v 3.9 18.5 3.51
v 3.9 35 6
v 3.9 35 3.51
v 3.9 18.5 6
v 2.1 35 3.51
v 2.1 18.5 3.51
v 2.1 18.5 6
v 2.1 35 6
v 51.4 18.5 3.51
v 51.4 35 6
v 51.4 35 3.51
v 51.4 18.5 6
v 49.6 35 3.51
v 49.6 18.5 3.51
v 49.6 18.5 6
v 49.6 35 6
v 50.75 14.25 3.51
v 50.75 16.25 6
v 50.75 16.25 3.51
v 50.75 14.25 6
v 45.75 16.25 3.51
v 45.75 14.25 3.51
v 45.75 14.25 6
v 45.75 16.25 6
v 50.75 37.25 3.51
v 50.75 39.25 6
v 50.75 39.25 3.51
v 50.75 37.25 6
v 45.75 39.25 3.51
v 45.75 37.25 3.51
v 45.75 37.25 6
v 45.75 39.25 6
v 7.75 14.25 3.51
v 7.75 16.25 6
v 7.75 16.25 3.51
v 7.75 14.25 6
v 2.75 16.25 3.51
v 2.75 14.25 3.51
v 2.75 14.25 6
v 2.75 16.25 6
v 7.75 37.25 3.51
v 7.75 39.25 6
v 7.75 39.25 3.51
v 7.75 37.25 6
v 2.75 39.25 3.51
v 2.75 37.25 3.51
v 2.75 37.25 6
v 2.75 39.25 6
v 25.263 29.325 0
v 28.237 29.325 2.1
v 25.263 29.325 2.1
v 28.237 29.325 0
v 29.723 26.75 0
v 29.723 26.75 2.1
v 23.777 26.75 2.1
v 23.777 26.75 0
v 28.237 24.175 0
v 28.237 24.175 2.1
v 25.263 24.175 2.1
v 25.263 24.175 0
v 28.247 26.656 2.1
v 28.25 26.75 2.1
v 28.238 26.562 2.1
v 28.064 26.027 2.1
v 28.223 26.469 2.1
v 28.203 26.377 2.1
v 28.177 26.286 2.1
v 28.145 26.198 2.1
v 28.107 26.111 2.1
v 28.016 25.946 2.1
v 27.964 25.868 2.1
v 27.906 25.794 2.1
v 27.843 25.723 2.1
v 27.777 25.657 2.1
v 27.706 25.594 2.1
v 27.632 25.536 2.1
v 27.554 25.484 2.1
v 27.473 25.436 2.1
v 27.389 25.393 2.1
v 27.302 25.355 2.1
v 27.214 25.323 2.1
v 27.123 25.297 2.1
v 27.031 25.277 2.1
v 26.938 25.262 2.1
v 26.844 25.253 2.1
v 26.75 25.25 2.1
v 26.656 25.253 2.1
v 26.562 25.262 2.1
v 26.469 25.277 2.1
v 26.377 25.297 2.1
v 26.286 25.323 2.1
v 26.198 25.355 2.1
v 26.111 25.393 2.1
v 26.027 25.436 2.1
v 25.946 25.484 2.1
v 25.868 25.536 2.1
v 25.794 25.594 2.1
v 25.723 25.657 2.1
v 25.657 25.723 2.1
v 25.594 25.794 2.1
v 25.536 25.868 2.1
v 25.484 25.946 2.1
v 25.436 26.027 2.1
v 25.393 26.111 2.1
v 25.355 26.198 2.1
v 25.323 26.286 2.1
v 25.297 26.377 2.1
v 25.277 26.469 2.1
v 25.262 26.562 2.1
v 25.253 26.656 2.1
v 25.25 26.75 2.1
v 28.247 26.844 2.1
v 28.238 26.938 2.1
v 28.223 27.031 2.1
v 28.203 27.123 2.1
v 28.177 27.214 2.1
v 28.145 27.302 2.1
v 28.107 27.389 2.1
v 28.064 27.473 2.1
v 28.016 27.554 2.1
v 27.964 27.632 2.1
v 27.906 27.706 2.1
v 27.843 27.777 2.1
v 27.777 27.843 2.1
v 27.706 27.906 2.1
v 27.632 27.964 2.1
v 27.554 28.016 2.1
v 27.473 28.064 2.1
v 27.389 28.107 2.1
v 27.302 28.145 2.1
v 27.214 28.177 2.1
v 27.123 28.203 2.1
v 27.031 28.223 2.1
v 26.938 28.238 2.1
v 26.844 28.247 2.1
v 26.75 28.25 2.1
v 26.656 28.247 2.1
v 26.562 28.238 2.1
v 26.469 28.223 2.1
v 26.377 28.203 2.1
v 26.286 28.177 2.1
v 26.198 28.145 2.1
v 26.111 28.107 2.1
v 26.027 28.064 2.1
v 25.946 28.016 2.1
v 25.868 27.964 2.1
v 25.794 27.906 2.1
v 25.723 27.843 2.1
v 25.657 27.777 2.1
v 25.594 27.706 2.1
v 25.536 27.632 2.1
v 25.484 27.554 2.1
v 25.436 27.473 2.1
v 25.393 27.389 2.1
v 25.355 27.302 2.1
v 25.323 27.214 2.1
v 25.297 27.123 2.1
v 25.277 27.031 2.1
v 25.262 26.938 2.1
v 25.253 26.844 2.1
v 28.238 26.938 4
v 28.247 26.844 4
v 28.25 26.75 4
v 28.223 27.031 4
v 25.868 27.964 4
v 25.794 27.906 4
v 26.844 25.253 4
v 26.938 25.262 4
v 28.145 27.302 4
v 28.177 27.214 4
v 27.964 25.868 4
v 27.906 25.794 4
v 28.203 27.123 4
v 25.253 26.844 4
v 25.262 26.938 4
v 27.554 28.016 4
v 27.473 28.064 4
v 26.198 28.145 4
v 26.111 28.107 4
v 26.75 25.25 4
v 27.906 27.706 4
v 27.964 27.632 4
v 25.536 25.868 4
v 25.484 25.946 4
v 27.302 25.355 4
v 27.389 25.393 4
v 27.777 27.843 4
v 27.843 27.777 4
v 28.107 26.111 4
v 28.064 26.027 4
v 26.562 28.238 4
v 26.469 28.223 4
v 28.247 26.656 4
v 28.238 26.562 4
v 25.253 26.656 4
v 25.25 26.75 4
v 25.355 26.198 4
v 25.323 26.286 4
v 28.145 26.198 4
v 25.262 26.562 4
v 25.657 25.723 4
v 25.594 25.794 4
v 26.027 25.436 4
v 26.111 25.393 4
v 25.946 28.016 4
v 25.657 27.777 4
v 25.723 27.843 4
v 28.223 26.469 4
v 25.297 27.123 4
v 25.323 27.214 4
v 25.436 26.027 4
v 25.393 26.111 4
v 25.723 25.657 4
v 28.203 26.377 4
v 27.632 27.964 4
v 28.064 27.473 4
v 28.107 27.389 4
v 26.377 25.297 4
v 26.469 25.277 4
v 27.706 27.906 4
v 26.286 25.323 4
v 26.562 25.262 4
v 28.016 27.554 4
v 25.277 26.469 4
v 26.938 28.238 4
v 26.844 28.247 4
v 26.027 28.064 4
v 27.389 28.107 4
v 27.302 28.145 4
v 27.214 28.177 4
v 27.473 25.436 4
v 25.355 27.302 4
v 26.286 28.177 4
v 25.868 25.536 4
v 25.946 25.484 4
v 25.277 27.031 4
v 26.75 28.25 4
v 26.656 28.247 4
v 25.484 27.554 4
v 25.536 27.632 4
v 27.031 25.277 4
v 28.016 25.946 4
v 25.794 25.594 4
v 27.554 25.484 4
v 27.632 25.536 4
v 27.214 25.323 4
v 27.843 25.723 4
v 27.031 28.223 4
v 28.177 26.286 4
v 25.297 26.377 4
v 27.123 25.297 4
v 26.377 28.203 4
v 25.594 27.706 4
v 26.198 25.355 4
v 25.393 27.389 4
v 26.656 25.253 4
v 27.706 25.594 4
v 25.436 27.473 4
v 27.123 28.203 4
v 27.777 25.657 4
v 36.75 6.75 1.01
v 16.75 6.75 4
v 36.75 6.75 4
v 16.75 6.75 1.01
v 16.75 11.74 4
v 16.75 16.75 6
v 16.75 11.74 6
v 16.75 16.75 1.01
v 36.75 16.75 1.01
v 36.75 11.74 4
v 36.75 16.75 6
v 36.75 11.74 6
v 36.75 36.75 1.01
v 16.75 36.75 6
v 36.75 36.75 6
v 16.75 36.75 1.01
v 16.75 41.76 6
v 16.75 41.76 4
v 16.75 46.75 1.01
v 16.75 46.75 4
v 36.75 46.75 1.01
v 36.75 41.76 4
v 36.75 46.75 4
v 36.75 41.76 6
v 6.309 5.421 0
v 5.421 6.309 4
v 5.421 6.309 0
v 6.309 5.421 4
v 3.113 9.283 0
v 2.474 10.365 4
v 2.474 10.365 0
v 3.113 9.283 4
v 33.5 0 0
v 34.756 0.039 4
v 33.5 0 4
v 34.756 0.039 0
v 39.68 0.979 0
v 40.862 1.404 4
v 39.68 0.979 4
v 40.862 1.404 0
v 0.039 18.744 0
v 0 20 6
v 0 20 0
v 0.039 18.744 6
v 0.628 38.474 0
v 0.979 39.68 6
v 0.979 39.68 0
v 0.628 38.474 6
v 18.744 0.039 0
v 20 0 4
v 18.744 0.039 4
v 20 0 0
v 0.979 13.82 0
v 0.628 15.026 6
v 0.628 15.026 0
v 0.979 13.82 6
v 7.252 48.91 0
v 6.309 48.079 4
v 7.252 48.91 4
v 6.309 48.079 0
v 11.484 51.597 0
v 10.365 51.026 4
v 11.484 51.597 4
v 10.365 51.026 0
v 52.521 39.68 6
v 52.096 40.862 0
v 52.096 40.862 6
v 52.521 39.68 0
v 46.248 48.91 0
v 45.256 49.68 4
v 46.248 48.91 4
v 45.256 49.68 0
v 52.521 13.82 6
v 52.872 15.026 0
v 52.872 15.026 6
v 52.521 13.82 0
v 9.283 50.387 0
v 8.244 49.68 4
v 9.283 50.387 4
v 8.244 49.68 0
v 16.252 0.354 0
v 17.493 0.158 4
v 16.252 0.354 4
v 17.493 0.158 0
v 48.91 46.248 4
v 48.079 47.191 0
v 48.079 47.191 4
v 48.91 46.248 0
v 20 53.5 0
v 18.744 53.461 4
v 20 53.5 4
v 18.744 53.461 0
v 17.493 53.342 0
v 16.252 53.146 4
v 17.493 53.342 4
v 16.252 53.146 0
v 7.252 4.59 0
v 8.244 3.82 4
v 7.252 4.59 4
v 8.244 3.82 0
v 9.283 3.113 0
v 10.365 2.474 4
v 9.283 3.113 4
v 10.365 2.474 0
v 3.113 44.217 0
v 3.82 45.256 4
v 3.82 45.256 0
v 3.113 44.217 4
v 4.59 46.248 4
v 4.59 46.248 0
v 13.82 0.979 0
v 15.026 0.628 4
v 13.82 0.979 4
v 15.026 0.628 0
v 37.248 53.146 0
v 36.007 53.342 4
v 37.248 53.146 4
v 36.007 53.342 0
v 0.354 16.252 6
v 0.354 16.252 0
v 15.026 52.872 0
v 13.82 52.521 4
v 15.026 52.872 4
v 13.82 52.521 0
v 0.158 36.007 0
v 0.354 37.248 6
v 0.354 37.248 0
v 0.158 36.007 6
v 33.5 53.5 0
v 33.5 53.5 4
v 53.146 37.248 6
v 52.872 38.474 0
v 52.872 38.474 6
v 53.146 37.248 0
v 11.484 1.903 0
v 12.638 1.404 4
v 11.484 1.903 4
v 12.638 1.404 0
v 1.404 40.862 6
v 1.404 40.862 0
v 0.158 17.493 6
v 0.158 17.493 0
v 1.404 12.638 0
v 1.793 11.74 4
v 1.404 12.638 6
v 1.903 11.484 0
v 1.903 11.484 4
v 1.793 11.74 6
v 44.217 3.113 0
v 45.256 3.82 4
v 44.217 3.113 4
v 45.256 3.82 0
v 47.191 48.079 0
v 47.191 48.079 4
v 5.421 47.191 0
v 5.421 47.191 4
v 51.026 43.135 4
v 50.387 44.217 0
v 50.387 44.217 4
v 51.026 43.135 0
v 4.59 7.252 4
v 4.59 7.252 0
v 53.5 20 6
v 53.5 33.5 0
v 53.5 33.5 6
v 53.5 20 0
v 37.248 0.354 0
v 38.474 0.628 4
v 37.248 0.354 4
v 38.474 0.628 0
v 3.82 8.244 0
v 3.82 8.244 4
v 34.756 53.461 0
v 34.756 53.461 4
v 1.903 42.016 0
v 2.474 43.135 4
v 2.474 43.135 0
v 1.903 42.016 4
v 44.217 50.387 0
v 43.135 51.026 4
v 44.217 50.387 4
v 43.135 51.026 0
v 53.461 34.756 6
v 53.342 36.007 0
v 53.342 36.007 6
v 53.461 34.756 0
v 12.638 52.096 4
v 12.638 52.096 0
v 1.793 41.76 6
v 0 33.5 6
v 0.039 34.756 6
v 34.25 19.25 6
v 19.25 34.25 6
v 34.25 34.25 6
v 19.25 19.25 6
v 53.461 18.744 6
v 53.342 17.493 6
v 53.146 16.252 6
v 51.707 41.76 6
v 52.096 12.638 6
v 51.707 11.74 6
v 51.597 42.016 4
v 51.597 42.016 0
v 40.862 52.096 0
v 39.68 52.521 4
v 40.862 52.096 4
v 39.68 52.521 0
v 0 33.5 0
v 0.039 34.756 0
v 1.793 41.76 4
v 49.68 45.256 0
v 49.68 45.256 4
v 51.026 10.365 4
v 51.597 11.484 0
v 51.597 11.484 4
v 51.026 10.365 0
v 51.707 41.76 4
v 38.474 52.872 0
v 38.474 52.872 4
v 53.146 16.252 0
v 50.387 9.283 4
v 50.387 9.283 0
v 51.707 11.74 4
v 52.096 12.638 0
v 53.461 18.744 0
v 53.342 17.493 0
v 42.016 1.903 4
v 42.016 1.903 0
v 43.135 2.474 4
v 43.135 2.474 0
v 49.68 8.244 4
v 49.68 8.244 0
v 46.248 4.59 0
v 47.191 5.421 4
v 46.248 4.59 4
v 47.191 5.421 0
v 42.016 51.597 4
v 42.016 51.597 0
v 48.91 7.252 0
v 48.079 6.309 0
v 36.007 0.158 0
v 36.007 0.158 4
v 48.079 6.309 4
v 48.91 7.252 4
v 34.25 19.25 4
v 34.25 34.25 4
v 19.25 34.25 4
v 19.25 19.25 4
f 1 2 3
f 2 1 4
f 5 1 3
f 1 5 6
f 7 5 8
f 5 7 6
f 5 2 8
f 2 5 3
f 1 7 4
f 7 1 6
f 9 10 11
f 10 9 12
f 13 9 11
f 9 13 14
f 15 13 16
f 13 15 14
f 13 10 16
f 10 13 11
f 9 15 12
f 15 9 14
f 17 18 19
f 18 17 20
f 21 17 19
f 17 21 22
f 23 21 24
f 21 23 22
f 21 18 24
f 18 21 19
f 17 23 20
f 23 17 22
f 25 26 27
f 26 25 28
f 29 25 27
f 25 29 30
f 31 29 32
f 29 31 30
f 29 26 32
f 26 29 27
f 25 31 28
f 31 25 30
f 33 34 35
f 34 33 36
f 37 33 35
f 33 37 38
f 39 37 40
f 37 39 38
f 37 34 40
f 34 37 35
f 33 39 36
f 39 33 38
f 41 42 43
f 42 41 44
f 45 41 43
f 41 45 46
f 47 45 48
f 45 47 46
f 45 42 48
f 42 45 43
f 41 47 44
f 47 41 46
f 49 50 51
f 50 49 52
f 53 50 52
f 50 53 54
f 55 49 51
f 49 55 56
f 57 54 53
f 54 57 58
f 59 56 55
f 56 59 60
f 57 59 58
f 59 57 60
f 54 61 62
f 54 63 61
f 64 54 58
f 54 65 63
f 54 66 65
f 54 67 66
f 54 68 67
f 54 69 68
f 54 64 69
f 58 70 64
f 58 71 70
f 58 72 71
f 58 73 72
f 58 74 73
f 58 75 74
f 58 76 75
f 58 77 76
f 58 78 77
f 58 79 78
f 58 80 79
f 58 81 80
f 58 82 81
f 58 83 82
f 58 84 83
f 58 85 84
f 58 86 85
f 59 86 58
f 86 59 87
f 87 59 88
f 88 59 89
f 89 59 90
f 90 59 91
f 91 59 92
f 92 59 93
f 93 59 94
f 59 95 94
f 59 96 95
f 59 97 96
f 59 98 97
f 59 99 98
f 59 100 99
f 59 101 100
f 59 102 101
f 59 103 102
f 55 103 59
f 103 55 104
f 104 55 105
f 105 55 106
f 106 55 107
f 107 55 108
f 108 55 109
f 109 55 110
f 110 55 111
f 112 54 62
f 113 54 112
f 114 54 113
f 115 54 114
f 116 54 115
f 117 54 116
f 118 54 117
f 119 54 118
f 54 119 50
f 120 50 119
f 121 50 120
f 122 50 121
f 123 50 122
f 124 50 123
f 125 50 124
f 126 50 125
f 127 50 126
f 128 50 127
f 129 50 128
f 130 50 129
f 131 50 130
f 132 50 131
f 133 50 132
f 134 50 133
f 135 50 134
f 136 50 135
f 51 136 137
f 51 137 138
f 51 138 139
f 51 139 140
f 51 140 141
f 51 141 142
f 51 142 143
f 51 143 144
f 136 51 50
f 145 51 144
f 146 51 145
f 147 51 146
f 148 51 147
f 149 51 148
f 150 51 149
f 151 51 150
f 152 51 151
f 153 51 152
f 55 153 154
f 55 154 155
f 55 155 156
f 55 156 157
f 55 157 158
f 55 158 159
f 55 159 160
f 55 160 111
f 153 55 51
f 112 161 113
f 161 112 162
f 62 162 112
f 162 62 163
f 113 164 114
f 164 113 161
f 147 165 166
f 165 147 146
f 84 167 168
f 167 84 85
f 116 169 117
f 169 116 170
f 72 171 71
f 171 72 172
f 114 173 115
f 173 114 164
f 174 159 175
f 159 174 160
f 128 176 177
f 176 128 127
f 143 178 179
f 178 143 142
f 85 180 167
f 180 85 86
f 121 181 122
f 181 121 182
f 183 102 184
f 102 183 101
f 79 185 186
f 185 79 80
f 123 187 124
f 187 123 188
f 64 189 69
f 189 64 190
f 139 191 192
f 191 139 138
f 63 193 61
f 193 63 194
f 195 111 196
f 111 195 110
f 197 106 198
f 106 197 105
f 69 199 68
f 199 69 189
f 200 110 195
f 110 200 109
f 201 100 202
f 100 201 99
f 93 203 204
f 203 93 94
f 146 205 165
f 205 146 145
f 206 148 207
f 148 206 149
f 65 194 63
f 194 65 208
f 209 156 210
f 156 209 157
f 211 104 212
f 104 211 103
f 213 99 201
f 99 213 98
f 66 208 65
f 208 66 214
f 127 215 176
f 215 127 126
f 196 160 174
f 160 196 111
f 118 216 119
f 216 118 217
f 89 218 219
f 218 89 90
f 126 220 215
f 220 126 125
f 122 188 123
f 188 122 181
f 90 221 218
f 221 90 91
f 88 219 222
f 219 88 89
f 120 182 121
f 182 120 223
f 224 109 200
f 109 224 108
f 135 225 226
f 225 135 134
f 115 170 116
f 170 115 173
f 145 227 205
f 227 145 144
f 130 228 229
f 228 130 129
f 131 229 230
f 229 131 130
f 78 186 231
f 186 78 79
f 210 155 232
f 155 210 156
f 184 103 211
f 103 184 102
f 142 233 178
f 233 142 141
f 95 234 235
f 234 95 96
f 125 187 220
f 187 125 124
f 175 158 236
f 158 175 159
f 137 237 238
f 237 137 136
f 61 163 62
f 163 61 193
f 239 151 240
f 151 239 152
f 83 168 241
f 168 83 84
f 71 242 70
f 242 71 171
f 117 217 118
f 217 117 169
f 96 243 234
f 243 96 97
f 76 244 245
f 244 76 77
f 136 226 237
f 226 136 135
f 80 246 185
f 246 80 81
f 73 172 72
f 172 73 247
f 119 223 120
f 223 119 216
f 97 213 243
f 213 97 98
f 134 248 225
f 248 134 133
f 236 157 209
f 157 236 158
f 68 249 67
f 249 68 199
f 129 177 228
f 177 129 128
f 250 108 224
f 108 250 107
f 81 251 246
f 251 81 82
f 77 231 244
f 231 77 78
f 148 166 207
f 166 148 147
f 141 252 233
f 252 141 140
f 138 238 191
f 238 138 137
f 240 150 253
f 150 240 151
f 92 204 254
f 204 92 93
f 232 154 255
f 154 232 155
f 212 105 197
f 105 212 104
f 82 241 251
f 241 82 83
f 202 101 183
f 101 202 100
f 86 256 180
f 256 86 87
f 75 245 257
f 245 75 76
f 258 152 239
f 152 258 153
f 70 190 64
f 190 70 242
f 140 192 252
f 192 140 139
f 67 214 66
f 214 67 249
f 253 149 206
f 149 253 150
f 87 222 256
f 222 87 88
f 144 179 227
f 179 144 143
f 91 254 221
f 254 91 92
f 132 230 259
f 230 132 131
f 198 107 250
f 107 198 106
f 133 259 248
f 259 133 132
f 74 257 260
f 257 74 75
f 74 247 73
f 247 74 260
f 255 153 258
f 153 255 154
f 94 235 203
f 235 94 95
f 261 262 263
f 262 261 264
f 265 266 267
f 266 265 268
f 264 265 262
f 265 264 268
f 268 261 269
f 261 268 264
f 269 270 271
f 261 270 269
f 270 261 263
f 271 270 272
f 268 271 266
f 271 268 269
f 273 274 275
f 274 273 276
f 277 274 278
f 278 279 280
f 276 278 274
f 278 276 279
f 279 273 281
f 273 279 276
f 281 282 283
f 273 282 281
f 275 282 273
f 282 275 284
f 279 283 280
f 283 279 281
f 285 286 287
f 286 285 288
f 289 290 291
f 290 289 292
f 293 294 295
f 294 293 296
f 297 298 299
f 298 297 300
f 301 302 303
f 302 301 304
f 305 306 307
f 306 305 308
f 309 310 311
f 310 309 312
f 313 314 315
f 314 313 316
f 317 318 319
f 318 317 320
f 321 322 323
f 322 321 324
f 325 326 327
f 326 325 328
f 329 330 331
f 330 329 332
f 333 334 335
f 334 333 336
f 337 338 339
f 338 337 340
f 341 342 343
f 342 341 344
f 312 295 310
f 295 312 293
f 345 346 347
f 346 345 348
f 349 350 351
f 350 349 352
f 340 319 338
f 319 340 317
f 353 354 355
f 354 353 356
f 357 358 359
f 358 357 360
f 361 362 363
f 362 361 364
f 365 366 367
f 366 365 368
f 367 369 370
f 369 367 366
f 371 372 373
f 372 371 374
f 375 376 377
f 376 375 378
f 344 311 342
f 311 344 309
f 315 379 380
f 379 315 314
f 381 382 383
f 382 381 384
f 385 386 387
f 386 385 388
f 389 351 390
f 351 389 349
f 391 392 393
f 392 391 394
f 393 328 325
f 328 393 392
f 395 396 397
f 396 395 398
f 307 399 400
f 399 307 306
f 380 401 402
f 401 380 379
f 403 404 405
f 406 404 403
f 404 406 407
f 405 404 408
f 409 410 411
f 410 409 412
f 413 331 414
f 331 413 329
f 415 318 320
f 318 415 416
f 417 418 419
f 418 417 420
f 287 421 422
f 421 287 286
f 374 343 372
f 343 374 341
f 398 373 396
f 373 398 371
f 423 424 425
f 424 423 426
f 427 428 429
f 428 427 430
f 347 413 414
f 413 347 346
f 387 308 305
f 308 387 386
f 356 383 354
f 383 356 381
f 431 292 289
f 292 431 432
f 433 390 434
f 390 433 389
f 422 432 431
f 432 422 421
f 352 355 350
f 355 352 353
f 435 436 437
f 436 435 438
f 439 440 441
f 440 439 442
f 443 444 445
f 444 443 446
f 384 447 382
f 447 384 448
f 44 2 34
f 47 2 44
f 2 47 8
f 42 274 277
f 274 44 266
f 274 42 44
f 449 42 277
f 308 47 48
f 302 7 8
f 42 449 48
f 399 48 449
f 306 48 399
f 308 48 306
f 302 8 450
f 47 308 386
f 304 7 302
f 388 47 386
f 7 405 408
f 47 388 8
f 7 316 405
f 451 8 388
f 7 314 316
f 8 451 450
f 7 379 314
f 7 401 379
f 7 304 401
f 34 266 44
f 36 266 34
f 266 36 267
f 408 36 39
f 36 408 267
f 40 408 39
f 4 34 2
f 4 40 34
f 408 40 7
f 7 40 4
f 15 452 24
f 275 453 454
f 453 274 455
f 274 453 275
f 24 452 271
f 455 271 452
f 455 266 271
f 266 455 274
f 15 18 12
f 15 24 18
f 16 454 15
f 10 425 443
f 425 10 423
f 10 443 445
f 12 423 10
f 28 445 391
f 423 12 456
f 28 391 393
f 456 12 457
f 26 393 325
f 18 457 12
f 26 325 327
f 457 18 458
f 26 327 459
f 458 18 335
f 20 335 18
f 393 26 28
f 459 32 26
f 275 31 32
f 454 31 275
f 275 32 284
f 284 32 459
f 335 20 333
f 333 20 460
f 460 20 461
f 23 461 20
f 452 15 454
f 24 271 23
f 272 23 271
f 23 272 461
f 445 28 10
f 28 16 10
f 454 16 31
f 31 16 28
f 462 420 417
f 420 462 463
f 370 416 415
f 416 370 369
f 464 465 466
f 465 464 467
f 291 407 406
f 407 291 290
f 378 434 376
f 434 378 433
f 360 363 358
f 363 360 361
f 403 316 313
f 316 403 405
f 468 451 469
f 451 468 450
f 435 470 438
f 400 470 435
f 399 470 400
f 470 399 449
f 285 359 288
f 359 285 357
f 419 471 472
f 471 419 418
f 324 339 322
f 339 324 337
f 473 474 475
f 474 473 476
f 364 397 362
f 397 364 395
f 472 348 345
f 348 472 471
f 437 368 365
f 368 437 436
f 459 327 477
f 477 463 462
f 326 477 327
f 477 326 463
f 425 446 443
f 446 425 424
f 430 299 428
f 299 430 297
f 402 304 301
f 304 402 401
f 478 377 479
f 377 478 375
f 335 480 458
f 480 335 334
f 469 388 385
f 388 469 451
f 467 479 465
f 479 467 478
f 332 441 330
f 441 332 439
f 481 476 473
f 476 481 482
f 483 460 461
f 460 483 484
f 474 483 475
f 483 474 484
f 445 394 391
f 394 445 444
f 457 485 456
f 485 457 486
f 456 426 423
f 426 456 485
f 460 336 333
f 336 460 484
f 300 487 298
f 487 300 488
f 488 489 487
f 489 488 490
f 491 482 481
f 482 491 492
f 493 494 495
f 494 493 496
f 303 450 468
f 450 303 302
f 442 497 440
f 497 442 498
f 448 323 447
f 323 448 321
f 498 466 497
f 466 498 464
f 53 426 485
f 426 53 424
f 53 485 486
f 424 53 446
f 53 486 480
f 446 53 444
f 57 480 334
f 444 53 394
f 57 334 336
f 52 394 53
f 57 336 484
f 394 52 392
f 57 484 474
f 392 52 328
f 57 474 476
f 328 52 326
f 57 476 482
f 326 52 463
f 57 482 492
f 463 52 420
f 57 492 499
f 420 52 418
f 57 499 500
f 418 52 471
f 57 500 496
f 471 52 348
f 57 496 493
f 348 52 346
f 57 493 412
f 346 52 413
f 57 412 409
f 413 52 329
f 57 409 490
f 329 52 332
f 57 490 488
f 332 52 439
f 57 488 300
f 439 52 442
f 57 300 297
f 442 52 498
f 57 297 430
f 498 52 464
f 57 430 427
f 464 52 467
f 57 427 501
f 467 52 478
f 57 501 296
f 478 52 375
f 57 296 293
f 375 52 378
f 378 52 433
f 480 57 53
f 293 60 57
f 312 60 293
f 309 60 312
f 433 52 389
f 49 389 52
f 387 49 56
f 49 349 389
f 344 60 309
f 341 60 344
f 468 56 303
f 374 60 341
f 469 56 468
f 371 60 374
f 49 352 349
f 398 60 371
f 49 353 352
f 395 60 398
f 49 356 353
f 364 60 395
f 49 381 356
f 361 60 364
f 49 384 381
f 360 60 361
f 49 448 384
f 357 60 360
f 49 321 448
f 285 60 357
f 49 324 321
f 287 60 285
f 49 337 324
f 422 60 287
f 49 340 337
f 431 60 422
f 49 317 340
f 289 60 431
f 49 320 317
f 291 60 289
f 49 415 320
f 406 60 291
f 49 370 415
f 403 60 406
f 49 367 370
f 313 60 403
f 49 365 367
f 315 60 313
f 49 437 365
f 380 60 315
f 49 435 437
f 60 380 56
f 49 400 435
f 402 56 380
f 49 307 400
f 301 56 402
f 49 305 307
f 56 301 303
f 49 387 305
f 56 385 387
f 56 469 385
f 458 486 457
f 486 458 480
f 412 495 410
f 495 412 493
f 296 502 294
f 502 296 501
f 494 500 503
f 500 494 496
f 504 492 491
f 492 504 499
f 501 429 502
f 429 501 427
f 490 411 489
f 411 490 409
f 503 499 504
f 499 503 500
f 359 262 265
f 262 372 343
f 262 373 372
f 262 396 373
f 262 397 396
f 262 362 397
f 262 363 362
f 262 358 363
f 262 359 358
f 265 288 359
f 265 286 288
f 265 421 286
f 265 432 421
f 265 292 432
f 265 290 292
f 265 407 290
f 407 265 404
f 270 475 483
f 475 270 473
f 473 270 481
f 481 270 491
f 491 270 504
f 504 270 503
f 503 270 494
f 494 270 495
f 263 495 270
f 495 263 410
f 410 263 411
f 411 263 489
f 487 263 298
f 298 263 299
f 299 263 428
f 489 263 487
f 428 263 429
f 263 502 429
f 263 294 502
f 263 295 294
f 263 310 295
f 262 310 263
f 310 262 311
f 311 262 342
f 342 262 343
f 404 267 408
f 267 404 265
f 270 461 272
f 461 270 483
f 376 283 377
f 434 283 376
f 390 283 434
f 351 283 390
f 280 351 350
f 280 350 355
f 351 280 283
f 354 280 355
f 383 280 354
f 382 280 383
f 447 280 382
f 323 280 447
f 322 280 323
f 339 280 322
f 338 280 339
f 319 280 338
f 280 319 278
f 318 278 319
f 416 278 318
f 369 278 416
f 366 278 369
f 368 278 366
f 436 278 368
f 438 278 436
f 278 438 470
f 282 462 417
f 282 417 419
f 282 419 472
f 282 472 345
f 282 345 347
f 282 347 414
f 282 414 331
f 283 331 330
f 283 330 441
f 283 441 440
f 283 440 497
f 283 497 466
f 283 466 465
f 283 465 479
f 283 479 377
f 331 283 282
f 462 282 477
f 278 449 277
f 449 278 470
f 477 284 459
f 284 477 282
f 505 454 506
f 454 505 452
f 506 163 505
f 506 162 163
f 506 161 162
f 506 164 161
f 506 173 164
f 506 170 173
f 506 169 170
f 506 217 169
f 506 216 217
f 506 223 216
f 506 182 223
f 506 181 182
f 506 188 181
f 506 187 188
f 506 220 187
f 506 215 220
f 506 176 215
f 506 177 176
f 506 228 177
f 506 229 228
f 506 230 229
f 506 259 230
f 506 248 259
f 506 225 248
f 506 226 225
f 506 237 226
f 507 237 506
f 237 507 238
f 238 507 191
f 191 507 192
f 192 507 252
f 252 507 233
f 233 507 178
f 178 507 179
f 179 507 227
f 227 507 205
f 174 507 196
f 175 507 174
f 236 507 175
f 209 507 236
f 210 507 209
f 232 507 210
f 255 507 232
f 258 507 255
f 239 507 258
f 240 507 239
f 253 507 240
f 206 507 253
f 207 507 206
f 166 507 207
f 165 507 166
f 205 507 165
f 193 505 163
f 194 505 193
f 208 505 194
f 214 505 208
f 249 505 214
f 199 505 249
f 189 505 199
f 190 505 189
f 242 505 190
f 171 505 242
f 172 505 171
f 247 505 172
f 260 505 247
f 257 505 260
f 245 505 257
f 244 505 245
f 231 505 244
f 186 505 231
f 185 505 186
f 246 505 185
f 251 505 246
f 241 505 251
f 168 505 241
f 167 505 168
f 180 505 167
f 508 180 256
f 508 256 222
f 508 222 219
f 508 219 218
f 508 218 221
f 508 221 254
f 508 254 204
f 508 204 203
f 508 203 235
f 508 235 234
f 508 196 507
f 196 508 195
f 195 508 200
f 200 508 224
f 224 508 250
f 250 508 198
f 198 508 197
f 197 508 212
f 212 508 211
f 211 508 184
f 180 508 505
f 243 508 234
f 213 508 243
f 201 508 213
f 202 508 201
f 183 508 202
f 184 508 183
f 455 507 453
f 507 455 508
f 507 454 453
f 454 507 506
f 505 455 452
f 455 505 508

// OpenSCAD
// file: parts.scad
Mtolerance = 0.1;
M5size = 7.8;

function M5() = M5size + Mtolerance;

// Fits a standard M2.5 nut when printed with PLA the nut does not fall out
function M2_5_Pla() = 4.95 + Mtolerance;

// Fits a standard M2.5 nut. The nut falls out. Ideal for metal printing
function M2_5() = 5.05 + Mtolerance;

module hexHole(flatToFlatDistance, depth) {
    previewOptimize = 0.1;
    hexagonSide = flatToFlatDistance / (cos(30) * 2);

    translate([0, 0, -previewOptimize]) {
        linear_extrude(height=depth + previewOptimize * 2, center=false) {
            polygon(points=[
                    [hexagonSide, 0],
                    [hexagonSide / 2, sqrt(3) * hexagonSide / 2],
                    [-hexagonSide / 2, sqrt(3) * hexagonSide / 2],
                    [-hexagonSide, 0],
                    [-hexagonSide / 2, -sqrt(3) * hexagonSide / 2],
                    [hexagonSide / 2, -sqrt(3) * hexagonSide / 2]
                ]);
        }
    }
}

// Rounded rectangle module
module rounded_rectangle(width, length, r, fn=64) {
    // ensure radius doesn't exceed half of width/height
    rr = min(r, width/2, length/2);

    translate([rr, rr])
        offset(r=rr, $fn=fn)
            square([width - 2*rr, length - 2*rr]);

}
// main file
use <./parts.scad>

module long_cutouts(distance=47.5,width=1.8,length=16.5, height=2.5) {
    translate([- distance/2 - width/2, - length/2, 0])
    translate([0, 0, 3.51]) {
        cube([width, length, height], center=false);

        translate([distance,0,0])
            cube([width, length, height], center=false);
    }
}

module short_cutouts(distance=43,distance_y=23,width=5,length=2, height=2.5) {
    translate([- distance/2 - width/2, -((distance_y+length)/2), 0])
        translate([0,0,3.51]) {
            {
                cube([width, length, height], center=false);

                translate([0, distance_y, 0])
                    cube([width, length, height], center=false);
            }

            translate([distance,0,0])
                {
                    cube([width, length, height], center=false);

                    translate([0, distance_y, 0])
                        cube([width, length, height], center=false);
                }
        }
}


module backplate(plate_size=53.5) {
    difference() {
        linear_extrude(height=6)
            rounded_rectangle(plate_size, plate_size, 20, fn=100);

        translate([plate_size/2 , plate_size/2, 0])
            long_cutouts();

        translate([plate_size/2 , plate_size/2, 0])
            short_cutouts();


        w1 = (plate_size - 30) / 2;
        translate([0,-0.01,4])
            cube([plate_size, w1, 5], center=false);

        translate([0,plate_size - w1 +.01,4])
            cube([plate_size, w1, 5], center=false);

        {
            translate([plate_size/2,plate_size/2,-.5]) {
                hexHole(flatToFlatDistance = M2_5(), depth=2.5);
                cylinder(d=3, h=50, center=false, $fn=100);
            }
        }

        translate([plate_size/2,plate_size/2,7.5 - 1])
            cube([15, 15, 5], center=true);

        // Magent cutouts
        translate([plate_size/2, plate_size/2-30/2, 3.51]) {
            rotate([0,0,90])
                cube([10, 20, 5], center=true);

            translate([0,30,0])
                rotate([0,0,90])
                    cube([10, 20, 5], center=true);
        }
    }
}
backplate();
